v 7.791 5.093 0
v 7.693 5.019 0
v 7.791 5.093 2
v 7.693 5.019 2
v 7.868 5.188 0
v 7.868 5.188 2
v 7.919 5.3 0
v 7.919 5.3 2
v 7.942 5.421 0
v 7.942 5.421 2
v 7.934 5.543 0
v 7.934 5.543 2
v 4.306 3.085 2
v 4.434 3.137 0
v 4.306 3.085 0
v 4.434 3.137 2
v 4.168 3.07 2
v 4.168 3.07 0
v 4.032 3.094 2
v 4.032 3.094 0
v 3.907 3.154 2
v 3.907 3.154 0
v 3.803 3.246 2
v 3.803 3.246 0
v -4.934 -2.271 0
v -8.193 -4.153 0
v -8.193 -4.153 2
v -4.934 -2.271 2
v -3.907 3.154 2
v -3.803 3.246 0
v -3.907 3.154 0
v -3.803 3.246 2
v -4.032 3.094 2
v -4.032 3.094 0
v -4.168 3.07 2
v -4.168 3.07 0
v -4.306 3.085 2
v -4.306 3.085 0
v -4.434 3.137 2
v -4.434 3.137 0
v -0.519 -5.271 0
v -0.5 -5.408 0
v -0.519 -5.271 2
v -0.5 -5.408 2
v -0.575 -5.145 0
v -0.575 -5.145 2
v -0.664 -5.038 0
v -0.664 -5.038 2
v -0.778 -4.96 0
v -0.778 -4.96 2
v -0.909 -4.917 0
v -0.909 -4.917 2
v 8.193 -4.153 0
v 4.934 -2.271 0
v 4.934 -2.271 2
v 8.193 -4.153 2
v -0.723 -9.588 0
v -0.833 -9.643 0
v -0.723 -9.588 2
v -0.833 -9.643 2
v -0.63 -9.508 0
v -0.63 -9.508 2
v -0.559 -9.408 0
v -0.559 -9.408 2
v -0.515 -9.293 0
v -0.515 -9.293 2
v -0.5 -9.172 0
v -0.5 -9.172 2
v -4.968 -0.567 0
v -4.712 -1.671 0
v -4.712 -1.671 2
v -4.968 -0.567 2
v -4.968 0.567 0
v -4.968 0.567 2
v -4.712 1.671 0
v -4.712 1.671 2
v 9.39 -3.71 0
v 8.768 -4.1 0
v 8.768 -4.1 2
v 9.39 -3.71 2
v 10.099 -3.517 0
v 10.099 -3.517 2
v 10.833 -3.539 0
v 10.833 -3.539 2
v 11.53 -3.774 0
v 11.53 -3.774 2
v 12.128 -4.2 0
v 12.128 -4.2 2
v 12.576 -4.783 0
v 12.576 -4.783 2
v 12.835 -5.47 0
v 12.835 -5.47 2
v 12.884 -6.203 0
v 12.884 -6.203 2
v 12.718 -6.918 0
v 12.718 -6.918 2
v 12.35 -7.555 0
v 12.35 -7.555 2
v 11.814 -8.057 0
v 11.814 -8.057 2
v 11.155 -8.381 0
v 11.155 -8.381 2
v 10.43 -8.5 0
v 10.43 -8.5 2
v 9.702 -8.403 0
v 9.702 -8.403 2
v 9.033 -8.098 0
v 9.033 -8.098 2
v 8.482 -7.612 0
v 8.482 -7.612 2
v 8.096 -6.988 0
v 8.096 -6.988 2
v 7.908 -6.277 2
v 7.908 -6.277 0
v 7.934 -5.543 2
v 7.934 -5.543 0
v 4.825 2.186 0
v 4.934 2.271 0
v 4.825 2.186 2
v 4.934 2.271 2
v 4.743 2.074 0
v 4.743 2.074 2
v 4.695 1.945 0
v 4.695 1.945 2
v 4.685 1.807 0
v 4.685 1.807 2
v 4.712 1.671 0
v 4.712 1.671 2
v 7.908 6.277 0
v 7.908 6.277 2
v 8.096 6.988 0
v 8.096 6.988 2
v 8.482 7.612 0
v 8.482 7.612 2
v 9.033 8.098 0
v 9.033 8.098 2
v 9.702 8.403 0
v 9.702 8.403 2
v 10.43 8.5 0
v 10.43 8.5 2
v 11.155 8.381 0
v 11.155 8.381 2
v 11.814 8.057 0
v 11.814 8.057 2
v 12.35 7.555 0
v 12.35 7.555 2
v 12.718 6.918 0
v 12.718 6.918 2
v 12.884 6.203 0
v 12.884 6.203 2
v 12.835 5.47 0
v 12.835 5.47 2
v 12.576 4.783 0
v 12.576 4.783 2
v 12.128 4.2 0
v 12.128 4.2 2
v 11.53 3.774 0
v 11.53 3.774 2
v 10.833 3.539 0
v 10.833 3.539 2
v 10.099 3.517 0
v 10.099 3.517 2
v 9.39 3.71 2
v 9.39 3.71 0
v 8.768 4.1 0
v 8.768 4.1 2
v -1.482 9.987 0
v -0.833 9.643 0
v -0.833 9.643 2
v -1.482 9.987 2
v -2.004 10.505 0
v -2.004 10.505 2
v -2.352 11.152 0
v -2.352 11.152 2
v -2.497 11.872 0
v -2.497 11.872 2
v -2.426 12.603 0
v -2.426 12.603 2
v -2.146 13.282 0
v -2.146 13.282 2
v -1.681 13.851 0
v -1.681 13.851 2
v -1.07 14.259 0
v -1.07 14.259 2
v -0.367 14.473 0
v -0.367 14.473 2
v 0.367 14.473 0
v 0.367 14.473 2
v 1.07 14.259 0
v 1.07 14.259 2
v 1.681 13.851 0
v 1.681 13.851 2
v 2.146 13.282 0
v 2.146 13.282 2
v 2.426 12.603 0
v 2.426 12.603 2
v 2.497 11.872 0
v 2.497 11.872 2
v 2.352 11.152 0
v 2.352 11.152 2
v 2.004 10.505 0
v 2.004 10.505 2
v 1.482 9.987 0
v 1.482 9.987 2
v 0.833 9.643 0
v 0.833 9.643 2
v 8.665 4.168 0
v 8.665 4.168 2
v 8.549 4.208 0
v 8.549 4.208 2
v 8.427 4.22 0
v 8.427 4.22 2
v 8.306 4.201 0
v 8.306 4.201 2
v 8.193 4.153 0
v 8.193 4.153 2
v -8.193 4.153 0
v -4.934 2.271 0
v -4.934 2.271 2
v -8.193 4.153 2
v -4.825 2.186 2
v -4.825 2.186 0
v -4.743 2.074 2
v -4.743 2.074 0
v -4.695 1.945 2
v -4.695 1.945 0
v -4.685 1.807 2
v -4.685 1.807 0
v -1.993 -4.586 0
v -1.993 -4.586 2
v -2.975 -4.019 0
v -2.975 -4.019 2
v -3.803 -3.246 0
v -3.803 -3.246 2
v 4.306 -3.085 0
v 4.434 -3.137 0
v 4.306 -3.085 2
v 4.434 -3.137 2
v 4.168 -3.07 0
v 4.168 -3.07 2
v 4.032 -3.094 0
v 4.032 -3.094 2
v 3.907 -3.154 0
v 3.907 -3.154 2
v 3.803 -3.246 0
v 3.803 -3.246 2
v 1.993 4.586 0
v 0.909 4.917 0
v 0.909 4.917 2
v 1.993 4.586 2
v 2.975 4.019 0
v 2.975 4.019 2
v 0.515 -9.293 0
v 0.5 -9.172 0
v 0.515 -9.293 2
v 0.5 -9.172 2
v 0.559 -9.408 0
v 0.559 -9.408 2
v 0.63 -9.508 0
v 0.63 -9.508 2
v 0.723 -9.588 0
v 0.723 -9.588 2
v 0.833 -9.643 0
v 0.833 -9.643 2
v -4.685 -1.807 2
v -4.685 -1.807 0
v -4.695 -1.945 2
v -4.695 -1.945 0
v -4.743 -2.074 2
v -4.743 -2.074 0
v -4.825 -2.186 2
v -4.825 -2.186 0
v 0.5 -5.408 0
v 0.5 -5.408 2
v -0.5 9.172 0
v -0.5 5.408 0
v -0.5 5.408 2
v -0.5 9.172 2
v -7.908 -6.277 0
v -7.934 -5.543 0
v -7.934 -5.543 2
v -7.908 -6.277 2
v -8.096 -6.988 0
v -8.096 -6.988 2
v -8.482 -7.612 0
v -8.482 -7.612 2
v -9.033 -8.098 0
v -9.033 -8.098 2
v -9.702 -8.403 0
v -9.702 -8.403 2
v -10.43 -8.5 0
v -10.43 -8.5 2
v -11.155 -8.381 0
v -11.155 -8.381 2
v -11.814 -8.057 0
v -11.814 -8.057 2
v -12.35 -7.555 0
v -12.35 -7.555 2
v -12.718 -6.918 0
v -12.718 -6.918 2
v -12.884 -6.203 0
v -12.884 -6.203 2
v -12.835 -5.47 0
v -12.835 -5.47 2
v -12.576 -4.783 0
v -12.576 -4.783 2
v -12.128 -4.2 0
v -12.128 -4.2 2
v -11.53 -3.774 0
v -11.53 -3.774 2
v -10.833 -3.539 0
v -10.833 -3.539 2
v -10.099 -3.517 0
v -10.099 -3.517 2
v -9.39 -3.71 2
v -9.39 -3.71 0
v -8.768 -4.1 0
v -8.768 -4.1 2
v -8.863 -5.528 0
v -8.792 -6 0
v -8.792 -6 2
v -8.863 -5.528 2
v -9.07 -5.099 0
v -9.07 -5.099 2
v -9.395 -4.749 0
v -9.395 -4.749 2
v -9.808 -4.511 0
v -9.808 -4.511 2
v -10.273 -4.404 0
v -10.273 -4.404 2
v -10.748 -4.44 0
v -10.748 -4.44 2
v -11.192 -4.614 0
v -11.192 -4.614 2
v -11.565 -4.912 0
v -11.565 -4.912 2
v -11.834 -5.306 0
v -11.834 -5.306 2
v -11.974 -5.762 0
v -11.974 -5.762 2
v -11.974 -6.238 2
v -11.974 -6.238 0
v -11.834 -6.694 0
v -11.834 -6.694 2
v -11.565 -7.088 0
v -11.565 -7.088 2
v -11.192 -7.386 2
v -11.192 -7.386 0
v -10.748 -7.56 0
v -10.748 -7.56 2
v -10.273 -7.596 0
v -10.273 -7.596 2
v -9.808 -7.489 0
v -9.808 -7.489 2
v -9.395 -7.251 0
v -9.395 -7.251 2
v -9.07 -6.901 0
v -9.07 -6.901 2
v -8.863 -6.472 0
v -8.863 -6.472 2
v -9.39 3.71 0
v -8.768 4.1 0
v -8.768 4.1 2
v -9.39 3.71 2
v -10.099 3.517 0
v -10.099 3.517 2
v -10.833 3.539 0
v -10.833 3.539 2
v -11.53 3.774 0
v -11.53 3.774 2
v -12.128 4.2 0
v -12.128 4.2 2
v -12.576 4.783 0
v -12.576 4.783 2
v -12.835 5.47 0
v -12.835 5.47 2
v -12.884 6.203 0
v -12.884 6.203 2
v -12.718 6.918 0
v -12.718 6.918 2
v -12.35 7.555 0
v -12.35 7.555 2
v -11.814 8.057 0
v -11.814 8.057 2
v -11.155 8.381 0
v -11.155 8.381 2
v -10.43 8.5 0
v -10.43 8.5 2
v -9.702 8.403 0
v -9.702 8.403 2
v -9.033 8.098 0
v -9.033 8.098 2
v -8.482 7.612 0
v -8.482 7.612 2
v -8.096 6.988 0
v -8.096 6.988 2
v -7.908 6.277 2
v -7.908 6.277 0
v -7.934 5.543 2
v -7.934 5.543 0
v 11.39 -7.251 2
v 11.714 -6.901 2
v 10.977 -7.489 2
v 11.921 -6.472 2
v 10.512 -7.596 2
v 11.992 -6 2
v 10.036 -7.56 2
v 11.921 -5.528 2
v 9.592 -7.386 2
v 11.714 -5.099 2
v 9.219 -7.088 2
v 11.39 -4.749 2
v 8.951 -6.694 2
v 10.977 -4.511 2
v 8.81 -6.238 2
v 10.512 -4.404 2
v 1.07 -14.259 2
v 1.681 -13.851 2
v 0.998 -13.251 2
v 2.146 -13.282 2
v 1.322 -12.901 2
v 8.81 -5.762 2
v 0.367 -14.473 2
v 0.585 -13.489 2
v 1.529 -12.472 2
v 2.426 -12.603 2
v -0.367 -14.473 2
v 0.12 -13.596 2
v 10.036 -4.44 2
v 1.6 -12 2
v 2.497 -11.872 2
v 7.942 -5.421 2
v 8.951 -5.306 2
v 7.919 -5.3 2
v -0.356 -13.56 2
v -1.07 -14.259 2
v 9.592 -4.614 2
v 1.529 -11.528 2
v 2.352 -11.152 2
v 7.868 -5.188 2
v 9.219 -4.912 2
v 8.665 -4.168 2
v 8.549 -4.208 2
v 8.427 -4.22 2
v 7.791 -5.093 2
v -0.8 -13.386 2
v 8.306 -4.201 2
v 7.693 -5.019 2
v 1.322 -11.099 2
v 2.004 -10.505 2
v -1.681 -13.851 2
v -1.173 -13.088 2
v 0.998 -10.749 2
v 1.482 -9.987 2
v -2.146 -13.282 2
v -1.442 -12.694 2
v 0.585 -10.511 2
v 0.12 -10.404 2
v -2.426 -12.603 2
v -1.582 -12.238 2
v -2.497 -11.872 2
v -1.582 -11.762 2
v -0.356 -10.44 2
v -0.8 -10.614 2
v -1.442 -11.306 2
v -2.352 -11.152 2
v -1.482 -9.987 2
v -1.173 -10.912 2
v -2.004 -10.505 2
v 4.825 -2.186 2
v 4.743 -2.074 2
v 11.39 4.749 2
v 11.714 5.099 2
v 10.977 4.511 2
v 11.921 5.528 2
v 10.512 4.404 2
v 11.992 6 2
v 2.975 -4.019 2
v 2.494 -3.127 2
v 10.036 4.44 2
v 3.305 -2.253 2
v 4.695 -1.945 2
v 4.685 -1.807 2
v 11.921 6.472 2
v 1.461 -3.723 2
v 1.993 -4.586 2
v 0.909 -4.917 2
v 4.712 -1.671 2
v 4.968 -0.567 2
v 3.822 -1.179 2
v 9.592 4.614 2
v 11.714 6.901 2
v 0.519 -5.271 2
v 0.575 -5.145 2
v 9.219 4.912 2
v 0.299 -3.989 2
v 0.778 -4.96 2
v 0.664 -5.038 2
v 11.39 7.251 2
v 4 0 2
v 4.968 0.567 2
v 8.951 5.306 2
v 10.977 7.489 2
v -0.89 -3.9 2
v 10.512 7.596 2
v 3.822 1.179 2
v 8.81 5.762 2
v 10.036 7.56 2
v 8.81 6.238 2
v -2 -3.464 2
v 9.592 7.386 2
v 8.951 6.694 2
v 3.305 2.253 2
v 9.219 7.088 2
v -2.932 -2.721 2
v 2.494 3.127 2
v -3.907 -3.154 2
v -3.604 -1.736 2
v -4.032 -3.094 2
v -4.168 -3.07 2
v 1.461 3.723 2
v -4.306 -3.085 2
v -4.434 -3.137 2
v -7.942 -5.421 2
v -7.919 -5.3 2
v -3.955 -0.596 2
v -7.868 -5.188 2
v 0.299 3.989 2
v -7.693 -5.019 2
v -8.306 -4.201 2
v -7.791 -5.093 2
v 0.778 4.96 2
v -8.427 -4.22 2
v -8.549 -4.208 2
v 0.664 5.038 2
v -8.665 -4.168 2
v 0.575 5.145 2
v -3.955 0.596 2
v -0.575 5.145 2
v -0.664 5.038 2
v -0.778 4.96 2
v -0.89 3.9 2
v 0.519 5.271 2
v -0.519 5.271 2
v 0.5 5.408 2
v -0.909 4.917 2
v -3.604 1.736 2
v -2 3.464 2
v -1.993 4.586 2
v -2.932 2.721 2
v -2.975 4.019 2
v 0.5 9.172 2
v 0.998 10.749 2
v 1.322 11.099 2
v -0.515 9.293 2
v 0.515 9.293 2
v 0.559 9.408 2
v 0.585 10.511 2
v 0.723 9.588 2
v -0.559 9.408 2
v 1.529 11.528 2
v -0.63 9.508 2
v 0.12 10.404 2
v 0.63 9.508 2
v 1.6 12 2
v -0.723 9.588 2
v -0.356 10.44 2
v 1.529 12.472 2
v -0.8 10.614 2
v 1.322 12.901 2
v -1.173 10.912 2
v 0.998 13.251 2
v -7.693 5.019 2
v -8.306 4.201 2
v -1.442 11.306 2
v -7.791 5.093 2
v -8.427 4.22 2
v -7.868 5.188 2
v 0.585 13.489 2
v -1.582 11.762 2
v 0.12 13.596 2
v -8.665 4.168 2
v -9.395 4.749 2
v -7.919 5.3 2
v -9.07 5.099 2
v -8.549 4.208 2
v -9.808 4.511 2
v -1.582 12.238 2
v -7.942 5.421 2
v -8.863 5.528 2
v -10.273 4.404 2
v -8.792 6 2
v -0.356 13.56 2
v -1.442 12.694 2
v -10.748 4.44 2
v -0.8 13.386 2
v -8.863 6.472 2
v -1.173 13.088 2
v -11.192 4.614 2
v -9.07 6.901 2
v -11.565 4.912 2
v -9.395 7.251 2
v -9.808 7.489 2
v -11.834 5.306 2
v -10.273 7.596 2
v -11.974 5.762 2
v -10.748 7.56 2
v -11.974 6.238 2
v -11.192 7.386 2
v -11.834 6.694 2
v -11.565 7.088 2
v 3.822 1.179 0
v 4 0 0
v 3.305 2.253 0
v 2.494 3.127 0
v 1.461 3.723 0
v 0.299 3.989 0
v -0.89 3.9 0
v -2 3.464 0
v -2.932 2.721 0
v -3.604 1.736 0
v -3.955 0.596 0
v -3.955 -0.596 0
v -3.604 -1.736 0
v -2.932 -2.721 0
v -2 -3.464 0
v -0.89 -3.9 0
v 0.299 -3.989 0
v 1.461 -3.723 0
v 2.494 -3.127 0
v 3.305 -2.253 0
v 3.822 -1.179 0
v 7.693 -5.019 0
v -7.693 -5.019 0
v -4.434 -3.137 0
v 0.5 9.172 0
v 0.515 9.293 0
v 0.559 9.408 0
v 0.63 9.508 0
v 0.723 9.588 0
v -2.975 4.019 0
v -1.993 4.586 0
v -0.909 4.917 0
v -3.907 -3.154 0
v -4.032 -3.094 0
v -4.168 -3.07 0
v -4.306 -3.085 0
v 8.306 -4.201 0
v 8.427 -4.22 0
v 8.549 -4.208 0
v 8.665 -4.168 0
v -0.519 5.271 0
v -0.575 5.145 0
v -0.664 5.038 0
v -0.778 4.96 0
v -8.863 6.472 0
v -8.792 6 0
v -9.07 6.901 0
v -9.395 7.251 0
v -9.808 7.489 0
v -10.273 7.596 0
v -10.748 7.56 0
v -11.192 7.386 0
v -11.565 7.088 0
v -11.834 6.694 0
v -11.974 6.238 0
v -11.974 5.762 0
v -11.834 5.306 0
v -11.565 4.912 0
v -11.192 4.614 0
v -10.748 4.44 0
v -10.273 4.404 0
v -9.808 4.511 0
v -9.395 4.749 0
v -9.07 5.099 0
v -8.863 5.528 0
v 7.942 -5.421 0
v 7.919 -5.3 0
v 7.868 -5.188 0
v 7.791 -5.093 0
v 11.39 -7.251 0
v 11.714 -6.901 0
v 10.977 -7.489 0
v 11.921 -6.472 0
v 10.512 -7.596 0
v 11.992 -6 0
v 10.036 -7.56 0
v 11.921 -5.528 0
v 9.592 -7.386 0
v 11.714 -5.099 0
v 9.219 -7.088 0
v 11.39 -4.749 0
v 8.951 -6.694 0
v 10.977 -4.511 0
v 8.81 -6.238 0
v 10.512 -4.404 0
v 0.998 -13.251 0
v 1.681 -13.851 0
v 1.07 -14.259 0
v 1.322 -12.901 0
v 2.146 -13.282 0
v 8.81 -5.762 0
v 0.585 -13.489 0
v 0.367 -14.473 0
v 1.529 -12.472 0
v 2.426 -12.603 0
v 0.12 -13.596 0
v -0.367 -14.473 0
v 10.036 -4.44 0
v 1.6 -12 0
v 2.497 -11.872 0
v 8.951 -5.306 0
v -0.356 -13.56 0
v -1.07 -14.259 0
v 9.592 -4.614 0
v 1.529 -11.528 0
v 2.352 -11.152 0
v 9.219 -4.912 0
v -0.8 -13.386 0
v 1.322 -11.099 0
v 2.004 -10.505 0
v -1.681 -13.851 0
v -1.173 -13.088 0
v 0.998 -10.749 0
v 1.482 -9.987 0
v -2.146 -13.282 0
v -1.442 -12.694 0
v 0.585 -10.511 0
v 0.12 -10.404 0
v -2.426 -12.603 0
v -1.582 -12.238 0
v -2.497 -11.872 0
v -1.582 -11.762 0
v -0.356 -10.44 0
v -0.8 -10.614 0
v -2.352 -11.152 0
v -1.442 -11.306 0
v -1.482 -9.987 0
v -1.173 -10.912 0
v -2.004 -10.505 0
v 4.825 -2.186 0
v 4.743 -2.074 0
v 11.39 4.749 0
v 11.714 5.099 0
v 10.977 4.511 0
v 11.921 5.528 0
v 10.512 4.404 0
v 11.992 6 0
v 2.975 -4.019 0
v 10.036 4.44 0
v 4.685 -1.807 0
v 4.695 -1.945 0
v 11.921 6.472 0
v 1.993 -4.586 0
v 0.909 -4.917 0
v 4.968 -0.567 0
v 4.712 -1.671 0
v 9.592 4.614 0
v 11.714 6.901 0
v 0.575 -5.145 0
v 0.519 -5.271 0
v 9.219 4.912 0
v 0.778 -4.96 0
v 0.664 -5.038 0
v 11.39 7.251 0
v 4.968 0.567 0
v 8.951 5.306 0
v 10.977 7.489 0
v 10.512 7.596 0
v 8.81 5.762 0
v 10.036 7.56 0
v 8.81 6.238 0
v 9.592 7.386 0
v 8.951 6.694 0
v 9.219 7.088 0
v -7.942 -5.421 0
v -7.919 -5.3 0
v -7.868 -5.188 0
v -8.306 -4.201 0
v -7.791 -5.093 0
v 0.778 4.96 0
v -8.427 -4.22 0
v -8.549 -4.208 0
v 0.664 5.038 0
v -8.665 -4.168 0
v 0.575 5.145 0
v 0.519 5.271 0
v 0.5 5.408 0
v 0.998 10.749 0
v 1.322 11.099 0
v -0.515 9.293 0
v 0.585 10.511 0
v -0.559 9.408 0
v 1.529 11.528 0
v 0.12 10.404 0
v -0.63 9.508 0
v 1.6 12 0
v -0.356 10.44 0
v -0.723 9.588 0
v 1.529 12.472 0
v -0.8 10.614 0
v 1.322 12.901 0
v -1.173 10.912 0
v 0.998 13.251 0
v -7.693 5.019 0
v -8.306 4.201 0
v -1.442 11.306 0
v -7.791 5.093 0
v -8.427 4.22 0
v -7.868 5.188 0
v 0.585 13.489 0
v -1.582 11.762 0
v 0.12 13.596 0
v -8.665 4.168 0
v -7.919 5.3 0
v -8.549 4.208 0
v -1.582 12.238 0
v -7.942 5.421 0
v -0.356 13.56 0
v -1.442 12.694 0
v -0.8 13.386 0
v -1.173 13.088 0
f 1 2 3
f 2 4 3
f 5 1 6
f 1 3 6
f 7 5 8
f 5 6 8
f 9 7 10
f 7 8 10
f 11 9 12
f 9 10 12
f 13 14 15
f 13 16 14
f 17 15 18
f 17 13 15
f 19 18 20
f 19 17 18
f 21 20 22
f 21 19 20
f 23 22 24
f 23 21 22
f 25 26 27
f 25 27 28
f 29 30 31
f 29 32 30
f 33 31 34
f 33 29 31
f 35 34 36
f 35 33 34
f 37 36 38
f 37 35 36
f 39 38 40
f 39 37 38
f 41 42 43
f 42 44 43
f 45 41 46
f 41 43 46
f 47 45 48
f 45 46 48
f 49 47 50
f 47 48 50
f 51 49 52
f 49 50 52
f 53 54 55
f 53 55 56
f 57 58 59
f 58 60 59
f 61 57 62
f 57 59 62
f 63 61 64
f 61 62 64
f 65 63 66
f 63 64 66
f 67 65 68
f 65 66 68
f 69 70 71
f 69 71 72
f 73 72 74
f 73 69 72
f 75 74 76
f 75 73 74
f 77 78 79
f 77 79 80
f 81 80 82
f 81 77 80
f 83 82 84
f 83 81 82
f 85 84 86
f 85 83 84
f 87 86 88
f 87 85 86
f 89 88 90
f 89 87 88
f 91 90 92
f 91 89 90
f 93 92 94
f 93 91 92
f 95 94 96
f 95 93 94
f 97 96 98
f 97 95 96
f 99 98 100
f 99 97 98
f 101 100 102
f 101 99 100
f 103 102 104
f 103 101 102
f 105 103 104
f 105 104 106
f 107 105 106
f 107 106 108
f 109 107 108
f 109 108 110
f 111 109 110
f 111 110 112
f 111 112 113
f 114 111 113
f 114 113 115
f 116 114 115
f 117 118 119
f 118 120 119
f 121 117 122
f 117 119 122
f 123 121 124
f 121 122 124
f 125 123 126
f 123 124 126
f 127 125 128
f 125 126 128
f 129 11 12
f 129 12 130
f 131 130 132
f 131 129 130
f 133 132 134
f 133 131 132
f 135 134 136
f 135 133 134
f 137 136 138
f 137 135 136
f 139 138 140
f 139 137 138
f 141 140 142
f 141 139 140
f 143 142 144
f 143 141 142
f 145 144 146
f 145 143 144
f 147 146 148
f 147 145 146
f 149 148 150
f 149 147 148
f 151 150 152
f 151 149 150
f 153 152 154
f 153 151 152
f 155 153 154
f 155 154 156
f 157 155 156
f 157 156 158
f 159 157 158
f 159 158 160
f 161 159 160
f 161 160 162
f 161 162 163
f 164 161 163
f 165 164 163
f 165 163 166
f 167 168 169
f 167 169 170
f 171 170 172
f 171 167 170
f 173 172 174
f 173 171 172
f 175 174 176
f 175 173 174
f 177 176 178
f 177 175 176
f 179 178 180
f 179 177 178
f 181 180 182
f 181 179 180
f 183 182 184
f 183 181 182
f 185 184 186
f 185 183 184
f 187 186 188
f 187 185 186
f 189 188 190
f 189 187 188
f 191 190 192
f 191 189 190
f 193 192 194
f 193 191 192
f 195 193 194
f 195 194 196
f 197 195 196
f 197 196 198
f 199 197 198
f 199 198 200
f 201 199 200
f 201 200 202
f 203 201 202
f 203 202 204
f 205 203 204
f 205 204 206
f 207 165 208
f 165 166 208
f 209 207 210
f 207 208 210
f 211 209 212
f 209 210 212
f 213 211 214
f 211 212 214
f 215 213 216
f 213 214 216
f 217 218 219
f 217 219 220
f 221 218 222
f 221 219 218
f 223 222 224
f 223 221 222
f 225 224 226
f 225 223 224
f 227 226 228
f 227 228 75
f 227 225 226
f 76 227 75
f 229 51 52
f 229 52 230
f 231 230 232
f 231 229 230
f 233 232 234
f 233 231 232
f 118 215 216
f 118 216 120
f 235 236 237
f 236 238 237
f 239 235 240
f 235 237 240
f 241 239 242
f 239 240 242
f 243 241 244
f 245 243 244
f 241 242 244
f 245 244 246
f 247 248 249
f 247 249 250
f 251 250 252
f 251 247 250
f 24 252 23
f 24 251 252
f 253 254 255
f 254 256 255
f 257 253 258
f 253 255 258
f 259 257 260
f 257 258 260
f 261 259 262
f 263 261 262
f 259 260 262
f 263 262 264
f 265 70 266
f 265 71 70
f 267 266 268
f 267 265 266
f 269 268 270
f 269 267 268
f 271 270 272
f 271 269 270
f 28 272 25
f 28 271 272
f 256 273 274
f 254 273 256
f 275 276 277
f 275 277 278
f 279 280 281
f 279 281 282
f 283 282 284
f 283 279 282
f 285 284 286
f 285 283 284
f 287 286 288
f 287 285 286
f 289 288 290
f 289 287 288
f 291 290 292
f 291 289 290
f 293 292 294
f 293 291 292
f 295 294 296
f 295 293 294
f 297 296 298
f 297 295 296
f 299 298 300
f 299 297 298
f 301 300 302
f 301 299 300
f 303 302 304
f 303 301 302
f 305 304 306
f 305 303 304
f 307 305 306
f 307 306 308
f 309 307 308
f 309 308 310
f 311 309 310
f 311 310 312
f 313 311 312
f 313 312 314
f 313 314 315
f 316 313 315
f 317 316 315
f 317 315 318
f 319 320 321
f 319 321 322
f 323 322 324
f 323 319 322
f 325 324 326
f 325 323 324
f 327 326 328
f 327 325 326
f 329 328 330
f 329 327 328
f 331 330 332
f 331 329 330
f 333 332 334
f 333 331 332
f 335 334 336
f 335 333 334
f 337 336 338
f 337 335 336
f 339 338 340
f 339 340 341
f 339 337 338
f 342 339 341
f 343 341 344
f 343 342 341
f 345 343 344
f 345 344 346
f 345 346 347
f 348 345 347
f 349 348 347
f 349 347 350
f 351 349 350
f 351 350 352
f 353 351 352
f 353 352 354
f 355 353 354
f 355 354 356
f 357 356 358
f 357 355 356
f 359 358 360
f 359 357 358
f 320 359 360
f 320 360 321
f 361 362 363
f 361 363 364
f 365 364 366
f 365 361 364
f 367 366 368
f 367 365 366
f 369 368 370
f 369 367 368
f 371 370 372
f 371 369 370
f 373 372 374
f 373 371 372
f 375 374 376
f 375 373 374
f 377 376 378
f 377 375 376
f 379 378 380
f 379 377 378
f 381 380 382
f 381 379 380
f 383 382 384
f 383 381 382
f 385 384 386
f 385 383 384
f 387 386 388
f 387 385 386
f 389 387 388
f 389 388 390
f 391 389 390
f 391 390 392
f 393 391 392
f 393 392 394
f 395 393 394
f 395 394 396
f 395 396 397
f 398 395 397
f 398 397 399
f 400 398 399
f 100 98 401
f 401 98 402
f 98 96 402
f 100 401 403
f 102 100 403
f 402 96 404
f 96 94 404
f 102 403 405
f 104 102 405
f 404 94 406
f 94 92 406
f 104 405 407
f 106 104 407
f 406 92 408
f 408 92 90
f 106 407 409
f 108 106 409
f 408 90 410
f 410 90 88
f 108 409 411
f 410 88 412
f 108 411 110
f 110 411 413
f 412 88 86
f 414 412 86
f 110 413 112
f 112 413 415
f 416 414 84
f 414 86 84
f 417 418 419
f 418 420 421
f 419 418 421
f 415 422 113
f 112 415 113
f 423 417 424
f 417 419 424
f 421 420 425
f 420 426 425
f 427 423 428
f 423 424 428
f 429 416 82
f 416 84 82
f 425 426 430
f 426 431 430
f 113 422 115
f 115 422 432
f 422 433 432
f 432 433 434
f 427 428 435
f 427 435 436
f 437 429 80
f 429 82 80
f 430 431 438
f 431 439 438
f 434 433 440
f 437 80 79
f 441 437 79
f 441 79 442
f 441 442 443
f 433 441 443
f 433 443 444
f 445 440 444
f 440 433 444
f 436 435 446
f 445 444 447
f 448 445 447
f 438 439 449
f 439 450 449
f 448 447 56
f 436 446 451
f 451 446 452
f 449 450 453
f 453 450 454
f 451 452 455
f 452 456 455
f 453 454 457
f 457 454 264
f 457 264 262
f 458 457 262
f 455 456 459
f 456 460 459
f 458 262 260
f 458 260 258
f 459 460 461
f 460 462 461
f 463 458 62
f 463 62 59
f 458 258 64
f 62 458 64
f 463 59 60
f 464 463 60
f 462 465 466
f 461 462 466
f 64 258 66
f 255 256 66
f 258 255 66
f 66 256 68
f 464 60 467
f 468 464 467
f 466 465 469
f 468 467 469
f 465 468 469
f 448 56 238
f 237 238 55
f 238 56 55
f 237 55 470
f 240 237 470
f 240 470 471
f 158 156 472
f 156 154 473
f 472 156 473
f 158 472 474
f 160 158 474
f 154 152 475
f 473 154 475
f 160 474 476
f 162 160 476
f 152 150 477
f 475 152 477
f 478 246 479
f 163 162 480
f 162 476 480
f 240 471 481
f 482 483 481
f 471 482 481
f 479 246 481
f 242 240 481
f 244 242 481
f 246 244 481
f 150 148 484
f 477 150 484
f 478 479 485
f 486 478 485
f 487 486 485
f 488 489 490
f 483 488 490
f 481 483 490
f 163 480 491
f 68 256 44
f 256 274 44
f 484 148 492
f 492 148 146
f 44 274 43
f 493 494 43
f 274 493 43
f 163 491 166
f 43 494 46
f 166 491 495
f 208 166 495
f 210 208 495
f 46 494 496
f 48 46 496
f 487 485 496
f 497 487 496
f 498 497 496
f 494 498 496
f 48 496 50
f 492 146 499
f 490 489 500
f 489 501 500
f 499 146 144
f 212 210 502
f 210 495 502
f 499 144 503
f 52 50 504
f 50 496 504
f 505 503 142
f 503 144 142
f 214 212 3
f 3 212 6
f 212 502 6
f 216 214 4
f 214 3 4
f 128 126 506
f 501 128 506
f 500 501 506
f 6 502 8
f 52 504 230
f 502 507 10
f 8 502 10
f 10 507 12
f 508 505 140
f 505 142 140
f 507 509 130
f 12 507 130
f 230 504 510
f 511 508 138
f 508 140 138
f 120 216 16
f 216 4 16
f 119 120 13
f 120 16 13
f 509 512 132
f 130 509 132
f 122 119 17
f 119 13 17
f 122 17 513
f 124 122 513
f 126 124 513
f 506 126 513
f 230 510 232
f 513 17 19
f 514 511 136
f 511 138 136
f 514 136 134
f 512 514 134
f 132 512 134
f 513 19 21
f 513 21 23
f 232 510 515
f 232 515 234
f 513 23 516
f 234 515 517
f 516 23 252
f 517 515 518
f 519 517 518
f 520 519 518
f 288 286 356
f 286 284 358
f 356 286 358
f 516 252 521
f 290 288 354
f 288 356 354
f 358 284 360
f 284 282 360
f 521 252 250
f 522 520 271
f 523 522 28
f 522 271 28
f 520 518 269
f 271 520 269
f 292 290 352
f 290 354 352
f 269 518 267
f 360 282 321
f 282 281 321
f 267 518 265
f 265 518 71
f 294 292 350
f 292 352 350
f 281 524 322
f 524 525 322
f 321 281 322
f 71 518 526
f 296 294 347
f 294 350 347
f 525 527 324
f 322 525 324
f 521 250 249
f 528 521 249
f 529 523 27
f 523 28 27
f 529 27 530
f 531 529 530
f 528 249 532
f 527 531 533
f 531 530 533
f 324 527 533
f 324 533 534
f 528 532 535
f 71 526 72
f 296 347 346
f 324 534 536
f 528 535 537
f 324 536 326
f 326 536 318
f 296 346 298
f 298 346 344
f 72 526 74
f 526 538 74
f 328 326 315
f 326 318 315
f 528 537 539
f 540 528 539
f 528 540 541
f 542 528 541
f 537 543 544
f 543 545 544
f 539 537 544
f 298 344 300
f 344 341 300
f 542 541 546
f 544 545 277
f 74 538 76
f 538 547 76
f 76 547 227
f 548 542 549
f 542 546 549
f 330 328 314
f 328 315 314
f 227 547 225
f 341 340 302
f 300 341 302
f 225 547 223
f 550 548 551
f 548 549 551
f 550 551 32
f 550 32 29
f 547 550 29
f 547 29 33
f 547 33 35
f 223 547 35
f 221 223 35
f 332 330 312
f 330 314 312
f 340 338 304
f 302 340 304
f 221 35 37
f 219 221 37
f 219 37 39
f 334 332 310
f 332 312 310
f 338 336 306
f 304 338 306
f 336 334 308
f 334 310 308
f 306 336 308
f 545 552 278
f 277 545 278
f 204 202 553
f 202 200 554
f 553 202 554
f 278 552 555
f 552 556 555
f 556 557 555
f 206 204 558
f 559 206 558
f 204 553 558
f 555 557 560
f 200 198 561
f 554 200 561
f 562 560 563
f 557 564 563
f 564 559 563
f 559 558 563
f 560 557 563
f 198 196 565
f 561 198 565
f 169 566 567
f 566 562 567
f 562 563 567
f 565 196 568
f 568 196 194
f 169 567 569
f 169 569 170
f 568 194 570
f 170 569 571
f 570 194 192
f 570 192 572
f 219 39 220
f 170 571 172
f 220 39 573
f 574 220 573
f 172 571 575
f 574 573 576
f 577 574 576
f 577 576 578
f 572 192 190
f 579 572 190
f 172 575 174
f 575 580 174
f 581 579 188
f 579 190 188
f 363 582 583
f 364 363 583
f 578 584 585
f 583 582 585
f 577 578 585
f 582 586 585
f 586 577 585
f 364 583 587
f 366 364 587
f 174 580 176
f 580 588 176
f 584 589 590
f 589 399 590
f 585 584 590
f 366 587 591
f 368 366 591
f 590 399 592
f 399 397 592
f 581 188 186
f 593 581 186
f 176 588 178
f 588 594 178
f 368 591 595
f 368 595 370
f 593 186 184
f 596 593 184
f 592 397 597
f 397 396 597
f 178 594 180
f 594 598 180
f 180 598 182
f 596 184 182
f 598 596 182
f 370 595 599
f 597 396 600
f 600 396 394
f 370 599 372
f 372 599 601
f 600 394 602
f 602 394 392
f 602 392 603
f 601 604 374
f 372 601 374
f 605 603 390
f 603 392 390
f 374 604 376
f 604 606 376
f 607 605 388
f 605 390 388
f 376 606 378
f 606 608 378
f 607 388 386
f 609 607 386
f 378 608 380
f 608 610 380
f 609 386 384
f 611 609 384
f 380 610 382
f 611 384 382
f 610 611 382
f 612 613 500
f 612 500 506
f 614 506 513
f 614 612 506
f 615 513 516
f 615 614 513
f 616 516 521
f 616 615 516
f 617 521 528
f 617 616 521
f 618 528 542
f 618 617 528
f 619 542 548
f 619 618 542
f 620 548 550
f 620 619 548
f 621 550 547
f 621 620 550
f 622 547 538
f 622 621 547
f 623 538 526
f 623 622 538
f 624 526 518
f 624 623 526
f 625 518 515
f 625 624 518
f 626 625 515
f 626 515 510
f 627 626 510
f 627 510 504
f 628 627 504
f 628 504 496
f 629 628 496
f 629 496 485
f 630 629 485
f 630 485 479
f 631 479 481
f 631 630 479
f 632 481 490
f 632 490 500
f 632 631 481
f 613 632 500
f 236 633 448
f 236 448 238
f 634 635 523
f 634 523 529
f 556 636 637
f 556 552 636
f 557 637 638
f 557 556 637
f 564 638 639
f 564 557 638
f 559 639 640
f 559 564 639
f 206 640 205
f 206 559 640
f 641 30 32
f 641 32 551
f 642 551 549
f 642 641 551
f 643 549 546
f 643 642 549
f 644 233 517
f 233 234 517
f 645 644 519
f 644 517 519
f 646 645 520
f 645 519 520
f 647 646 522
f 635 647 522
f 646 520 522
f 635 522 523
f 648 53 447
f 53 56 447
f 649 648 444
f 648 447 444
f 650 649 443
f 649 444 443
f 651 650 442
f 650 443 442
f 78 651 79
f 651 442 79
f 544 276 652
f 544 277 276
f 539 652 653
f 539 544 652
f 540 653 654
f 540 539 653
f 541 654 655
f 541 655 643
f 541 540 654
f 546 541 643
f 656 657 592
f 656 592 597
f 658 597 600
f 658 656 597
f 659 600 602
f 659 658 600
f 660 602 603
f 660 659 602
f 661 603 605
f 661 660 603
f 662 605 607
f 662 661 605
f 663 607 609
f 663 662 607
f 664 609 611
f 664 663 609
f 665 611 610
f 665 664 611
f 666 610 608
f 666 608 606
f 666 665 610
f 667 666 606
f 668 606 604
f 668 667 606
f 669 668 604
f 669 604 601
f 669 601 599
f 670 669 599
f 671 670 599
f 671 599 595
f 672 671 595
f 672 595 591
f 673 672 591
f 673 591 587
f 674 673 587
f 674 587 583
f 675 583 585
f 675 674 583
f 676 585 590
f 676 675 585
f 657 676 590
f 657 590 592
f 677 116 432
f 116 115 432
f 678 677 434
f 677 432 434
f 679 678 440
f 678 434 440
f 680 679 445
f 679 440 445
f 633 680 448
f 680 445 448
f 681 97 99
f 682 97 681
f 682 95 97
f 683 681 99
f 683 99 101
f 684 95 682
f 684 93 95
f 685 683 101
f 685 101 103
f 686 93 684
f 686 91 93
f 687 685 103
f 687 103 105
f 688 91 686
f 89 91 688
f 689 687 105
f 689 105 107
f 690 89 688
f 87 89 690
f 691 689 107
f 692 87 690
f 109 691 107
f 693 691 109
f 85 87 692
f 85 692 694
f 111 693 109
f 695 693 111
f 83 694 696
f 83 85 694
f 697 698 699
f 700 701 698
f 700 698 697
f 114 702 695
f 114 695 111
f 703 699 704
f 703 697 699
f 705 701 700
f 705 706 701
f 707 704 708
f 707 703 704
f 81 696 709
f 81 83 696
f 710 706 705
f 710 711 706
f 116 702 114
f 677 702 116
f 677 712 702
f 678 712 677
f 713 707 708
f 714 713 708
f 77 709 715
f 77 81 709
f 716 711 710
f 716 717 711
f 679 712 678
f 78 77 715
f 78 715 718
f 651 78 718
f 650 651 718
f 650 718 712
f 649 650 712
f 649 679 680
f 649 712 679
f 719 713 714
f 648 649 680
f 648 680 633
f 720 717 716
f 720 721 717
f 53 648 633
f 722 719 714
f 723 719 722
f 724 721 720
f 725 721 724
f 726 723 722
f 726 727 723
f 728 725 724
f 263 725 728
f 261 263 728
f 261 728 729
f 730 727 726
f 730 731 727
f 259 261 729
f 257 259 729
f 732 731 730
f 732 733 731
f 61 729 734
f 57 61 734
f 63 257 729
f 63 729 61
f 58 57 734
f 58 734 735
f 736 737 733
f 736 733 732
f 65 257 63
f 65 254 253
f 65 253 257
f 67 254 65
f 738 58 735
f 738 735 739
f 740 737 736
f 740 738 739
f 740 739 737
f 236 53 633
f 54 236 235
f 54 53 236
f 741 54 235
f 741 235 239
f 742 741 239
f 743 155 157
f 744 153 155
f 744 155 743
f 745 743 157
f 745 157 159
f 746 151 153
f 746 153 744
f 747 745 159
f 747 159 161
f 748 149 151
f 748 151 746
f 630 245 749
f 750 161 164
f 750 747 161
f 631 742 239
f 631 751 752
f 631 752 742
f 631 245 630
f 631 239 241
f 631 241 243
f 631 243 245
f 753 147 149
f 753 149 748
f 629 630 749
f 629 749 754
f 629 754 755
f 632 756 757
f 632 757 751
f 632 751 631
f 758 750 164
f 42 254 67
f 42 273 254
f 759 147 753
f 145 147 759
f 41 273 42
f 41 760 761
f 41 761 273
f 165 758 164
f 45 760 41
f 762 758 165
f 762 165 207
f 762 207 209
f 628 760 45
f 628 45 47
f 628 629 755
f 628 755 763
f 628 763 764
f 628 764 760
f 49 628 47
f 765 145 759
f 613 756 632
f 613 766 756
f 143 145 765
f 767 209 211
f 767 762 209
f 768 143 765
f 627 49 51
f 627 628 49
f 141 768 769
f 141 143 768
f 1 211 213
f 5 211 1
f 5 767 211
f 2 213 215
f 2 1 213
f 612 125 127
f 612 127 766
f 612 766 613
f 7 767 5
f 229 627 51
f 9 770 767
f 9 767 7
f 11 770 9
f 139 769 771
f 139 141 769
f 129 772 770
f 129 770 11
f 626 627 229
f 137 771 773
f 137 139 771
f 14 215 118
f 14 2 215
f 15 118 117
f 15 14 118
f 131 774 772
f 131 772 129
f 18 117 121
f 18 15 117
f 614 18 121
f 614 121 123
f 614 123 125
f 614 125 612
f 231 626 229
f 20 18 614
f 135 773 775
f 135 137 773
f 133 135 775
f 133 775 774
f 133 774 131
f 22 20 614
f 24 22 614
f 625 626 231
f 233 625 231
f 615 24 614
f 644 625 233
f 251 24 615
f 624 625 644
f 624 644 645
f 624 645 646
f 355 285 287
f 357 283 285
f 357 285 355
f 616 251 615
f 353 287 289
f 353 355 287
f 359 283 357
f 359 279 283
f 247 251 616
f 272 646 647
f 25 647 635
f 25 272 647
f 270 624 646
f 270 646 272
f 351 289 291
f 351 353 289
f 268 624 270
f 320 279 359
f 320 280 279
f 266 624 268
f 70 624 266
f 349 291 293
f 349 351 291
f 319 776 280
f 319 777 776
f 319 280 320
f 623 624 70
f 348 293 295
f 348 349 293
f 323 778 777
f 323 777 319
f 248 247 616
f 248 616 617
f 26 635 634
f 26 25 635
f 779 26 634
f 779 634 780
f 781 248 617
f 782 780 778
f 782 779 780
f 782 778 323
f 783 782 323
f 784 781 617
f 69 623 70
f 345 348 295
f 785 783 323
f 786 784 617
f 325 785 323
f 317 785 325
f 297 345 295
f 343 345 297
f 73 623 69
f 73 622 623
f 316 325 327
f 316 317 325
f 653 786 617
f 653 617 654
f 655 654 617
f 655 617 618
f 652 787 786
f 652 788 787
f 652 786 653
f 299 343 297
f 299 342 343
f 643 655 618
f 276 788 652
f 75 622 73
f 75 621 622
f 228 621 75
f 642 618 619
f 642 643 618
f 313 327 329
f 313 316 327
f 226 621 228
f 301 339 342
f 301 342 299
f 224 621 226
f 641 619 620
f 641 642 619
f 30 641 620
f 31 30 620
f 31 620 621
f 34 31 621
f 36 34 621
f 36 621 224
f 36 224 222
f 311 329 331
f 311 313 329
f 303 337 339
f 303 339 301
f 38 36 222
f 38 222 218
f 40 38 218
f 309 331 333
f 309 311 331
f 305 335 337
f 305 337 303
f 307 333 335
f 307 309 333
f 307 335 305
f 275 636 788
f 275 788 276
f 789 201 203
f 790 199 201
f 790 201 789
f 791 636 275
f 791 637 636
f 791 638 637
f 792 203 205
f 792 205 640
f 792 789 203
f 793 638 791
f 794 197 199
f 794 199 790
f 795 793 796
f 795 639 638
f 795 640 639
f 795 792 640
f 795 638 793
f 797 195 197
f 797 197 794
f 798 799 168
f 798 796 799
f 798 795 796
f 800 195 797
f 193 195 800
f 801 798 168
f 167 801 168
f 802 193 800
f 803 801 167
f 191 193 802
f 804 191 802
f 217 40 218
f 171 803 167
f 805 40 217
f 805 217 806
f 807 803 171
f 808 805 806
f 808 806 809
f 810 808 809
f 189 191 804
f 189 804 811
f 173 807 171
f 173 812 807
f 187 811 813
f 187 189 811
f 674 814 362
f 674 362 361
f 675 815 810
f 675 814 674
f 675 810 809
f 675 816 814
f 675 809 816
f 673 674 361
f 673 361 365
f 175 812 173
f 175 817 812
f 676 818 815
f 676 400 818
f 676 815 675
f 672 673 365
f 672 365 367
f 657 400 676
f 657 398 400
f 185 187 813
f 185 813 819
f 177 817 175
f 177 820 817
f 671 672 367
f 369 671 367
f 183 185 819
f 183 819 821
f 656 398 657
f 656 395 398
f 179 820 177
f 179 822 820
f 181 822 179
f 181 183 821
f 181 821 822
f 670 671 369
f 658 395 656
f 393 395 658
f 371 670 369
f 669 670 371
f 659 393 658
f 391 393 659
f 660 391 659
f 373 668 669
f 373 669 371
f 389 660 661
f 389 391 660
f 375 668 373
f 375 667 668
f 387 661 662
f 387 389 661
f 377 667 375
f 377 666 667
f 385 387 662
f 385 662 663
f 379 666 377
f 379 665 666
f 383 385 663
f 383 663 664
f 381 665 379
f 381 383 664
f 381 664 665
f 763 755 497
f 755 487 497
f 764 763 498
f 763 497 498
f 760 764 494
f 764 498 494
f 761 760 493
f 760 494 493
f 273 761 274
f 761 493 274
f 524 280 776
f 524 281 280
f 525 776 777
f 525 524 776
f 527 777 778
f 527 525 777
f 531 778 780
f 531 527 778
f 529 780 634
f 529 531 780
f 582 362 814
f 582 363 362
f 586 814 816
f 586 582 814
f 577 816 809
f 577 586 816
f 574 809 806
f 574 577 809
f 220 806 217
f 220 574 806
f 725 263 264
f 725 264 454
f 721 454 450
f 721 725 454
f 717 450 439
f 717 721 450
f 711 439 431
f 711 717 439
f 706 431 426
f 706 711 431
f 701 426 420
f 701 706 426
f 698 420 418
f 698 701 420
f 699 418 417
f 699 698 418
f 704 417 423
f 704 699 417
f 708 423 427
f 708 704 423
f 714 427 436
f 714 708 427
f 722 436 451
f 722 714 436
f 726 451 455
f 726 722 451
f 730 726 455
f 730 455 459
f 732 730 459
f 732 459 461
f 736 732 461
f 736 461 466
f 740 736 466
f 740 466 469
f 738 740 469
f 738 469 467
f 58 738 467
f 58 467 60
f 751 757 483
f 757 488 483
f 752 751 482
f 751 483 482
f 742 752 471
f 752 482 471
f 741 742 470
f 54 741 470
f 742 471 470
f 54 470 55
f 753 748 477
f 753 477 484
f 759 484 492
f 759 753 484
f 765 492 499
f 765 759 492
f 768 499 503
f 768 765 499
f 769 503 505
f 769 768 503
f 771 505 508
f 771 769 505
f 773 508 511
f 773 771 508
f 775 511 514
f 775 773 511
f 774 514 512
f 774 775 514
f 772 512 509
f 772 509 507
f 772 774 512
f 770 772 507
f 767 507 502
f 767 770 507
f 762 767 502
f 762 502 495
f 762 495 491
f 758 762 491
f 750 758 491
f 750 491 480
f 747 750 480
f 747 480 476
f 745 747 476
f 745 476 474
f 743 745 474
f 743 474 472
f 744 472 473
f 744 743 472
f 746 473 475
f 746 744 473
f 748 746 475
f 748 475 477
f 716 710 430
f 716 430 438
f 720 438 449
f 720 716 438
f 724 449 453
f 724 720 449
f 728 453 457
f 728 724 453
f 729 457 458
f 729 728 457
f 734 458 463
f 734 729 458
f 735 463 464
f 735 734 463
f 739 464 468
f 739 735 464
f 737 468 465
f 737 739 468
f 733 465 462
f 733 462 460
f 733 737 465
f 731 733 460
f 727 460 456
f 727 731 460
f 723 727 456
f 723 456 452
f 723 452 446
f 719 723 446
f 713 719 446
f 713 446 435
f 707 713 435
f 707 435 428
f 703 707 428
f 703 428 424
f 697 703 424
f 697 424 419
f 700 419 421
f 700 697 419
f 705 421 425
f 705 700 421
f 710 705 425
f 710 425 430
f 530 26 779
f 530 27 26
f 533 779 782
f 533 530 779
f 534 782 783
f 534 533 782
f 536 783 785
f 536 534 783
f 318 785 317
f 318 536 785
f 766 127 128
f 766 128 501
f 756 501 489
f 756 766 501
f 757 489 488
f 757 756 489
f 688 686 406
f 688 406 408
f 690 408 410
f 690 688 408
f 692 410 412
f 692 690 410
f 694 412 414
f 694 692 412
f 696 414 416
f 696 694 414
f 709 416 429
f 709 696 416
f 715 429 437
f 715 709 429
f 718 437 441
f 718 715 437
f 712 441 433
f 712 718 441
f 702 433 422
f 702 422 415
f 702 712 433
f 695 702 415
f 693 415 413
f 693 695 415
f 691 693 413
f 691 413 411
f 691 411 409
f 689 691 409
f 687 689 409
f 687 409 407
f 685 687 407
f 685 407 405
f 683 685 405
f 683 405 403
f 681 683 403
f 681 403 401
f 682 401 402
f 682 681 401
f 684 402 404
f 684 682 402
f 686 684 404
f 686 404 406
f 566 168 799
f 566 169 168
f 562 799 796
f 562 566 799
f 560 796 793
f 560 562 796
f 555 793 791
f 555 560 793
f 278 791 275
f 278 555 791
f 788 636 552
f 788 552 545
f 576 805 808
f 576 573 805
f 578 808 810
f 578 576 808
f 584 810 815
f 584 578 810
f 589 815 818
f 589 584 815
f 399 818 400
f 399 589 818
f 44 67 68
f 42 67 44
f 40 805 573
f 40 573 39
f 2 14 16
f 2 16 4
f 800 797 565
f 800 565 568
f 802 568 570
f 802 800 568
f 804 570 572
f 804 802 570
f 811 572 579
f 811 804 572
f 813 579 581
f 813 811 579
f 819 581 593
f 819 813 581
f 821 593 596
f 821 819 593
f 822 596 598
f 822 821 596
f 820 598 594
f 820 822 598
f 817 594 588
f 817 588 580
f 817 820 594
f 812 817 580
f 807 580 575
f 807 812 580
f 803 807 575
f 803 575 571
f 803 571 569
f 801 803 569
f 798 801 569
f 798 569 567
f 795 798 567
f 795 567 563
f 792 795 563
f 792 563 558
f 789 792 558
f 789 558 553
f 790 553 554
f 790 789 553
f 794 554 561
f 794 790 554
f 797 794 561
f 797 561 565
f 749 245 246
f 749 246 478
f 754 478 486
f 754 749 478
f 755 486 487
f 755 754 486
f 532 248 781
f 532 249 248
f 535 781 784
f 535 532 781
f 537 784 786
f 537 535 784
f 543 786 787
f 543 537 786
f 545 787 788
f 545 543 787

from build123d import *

# Parameters (mm, degrees)
SKETCH_1_R      = 1.6
SKETCH_1_R_2    = 4
EXTRUDE_1_DEPTH = 2
FILLET_1_R      = 0.5


with BuildPart() as part:
    # ｽｹｯﾁ1 → ﾎﾞｽ - 押し出し1 (new body)
    with BuildSketch(Plane.XY):
        with BuildLine():
            Line((4.058421985, 2.920481295), (8.020984502, 5.208267831))
            ThreePointArc((8.020984502, 5.208267831), (12.557368355, 7.25), (8.520984502, 4.342242427))
            Line((8.520984502, 4.342242427), (4.558421985, 2.054455891))
            ThreePointArc((4.558421985, 2.054455891), (5, 0), (4.558421985, -2.054455891))
            Line((4.558421985, -2.054455891), (8.520984502, -4.342242427))
            ThreePointArc((8.520984502, -4.342242427), (12.557368355, -7.25), (8.020984502, -5.208267831))
            Line((8.020984502, -5.208267831), (4.058421985, -2.920481295))
            ThreePointArc((4.058421985, -2.920481295), (2.5, -4.330127019), (0.5, -4.974937186))
            Line((0.5, -4.974937186), (0.5, -9.550510257))
            ThreePointArc((0.5, -9.550510257), (0, -14.5), (-0.5, -9.550510257))
            Line((-0.5, -9.550510257), (-0.5, -4.974937186))
            ThreePointArc((-0.5, -4.974937186), (-2.5, -4.330127019), (-4.058421985, -2.920481295))
            Line((-4.058421985, -2.920481295), (-8.020984502, -5.208267831))
            ThreePointArc((-8.020984502, -5.208267831), (-12.557368355, -7.25), (-8.520984502, -4.342242427))
            Line((-8.520984502, -4.342242427), (-4.558421985, -2.054455891))
            ThreePointArc((-4.558421985, -2.054455891), (-5, 0), (-4.558421985, 2.054455891))
            Line((-4.558421985, 2.054455891), (-8.520984502, 4.342242427))
            ThreePointArc((-8.520984502, 4.342242427), (-12.557368355, 7.25), (-8.020984502, 5.208267831))
            Line((-8.020984502, 5.208267831), (-4.058421985, 2.920481295))
            ThreePointArc((-4.058421985, 2.920481295), (-2.5, 4.330127019), (-0.5, 4.974937186))
            Line((-0.5, 4.974937186), (-0.5, 9.550510257))
            ThreePointArc((-0.5, 9.550510257), (0, 14.5), (0.5, 9.550510257))
            Line((0.5, 9.550510257), (0.5, 4.974937186))
            ThreePointArc((0.5, 4.974937186), (2.5, 4.330127019), (4.058421985, 2.920481295))
        make_face()
        with Locations((0, 12)):
            Circle(SKETCH_1_R, mode=Mode.SUBTRACT)
        with Locations((10.392304845, 6)):
            Circle(SKETCH_1_R, mode=Mode.SUBTRACT)
        with Locations((10.392304845, -6)):
            Circle(SKETCH_1_R, mode=Mode.SUBTRACT)
        with Locations((0, -12)):
            Circle(SKETCH_1_R, mode=Mode.SUBTRACT)
        with Locations((-10.392304845, -6)):
            Circle(SKETCH_1_R, mode=Mode.SUBTRACT)
        with Locations((-10.392304845, 6)):
            Circle(SKETCH_1_R, mode=Mode.SUBTRACT)
        Circle(SKETCH_1_R_2, mode=Mode.SUBTRACT)
    extrude(amount=EXTRUDE_1_DEPTH)

    # ﾌｨﾚｯﾄ1
    fillet_1_edges = [part.edges().sort_by_distance(p)[0] for p in [
        (0.5, 9.550510257, 1),
        (0.5, 4.974937186, 1),
        (4.058421985, 2.920481295, 1),
        (8.020984502, 5.208267831, 1),
        (8.520984502, 4.342242427, 1),
        (4.558421985, 2.054455891, 1),
        (4.558421985, -2.054455891, 1),
        (8.520984502, -4.342242427, 1),
        (8.020984502, -5.208267831, 1),
        (4.058421985, -2.920481295, 1),
        (0.5, -4.974937186, 1),
        (0.5, -9.550510257, 1),
        (-0.5, -9.550510257, 1),
        (-0.5, -4.974937186, 1),
        (-4.058421985, -2.920481295, 1),
        (-8.020984502, -5.208267831, 1),
        (-8.520984502, -4.342242427, 1),
        (-4.558421985, -2.054455891, 1),
        (-4.558421985, 2.054455891, 1),
        (-8.520984502, 4.342242427, 1),
        (-8.020984502, 5.208267831, 1),
        (-4.058421985, 2.920481295, 1),
        (-0.5, 4.974937186, 1),
        (-0.5, 9.550510257, 1),
    ]]
    fillet(fillet_1_edges, radius=FILLET_1_R)


solid = part.part
